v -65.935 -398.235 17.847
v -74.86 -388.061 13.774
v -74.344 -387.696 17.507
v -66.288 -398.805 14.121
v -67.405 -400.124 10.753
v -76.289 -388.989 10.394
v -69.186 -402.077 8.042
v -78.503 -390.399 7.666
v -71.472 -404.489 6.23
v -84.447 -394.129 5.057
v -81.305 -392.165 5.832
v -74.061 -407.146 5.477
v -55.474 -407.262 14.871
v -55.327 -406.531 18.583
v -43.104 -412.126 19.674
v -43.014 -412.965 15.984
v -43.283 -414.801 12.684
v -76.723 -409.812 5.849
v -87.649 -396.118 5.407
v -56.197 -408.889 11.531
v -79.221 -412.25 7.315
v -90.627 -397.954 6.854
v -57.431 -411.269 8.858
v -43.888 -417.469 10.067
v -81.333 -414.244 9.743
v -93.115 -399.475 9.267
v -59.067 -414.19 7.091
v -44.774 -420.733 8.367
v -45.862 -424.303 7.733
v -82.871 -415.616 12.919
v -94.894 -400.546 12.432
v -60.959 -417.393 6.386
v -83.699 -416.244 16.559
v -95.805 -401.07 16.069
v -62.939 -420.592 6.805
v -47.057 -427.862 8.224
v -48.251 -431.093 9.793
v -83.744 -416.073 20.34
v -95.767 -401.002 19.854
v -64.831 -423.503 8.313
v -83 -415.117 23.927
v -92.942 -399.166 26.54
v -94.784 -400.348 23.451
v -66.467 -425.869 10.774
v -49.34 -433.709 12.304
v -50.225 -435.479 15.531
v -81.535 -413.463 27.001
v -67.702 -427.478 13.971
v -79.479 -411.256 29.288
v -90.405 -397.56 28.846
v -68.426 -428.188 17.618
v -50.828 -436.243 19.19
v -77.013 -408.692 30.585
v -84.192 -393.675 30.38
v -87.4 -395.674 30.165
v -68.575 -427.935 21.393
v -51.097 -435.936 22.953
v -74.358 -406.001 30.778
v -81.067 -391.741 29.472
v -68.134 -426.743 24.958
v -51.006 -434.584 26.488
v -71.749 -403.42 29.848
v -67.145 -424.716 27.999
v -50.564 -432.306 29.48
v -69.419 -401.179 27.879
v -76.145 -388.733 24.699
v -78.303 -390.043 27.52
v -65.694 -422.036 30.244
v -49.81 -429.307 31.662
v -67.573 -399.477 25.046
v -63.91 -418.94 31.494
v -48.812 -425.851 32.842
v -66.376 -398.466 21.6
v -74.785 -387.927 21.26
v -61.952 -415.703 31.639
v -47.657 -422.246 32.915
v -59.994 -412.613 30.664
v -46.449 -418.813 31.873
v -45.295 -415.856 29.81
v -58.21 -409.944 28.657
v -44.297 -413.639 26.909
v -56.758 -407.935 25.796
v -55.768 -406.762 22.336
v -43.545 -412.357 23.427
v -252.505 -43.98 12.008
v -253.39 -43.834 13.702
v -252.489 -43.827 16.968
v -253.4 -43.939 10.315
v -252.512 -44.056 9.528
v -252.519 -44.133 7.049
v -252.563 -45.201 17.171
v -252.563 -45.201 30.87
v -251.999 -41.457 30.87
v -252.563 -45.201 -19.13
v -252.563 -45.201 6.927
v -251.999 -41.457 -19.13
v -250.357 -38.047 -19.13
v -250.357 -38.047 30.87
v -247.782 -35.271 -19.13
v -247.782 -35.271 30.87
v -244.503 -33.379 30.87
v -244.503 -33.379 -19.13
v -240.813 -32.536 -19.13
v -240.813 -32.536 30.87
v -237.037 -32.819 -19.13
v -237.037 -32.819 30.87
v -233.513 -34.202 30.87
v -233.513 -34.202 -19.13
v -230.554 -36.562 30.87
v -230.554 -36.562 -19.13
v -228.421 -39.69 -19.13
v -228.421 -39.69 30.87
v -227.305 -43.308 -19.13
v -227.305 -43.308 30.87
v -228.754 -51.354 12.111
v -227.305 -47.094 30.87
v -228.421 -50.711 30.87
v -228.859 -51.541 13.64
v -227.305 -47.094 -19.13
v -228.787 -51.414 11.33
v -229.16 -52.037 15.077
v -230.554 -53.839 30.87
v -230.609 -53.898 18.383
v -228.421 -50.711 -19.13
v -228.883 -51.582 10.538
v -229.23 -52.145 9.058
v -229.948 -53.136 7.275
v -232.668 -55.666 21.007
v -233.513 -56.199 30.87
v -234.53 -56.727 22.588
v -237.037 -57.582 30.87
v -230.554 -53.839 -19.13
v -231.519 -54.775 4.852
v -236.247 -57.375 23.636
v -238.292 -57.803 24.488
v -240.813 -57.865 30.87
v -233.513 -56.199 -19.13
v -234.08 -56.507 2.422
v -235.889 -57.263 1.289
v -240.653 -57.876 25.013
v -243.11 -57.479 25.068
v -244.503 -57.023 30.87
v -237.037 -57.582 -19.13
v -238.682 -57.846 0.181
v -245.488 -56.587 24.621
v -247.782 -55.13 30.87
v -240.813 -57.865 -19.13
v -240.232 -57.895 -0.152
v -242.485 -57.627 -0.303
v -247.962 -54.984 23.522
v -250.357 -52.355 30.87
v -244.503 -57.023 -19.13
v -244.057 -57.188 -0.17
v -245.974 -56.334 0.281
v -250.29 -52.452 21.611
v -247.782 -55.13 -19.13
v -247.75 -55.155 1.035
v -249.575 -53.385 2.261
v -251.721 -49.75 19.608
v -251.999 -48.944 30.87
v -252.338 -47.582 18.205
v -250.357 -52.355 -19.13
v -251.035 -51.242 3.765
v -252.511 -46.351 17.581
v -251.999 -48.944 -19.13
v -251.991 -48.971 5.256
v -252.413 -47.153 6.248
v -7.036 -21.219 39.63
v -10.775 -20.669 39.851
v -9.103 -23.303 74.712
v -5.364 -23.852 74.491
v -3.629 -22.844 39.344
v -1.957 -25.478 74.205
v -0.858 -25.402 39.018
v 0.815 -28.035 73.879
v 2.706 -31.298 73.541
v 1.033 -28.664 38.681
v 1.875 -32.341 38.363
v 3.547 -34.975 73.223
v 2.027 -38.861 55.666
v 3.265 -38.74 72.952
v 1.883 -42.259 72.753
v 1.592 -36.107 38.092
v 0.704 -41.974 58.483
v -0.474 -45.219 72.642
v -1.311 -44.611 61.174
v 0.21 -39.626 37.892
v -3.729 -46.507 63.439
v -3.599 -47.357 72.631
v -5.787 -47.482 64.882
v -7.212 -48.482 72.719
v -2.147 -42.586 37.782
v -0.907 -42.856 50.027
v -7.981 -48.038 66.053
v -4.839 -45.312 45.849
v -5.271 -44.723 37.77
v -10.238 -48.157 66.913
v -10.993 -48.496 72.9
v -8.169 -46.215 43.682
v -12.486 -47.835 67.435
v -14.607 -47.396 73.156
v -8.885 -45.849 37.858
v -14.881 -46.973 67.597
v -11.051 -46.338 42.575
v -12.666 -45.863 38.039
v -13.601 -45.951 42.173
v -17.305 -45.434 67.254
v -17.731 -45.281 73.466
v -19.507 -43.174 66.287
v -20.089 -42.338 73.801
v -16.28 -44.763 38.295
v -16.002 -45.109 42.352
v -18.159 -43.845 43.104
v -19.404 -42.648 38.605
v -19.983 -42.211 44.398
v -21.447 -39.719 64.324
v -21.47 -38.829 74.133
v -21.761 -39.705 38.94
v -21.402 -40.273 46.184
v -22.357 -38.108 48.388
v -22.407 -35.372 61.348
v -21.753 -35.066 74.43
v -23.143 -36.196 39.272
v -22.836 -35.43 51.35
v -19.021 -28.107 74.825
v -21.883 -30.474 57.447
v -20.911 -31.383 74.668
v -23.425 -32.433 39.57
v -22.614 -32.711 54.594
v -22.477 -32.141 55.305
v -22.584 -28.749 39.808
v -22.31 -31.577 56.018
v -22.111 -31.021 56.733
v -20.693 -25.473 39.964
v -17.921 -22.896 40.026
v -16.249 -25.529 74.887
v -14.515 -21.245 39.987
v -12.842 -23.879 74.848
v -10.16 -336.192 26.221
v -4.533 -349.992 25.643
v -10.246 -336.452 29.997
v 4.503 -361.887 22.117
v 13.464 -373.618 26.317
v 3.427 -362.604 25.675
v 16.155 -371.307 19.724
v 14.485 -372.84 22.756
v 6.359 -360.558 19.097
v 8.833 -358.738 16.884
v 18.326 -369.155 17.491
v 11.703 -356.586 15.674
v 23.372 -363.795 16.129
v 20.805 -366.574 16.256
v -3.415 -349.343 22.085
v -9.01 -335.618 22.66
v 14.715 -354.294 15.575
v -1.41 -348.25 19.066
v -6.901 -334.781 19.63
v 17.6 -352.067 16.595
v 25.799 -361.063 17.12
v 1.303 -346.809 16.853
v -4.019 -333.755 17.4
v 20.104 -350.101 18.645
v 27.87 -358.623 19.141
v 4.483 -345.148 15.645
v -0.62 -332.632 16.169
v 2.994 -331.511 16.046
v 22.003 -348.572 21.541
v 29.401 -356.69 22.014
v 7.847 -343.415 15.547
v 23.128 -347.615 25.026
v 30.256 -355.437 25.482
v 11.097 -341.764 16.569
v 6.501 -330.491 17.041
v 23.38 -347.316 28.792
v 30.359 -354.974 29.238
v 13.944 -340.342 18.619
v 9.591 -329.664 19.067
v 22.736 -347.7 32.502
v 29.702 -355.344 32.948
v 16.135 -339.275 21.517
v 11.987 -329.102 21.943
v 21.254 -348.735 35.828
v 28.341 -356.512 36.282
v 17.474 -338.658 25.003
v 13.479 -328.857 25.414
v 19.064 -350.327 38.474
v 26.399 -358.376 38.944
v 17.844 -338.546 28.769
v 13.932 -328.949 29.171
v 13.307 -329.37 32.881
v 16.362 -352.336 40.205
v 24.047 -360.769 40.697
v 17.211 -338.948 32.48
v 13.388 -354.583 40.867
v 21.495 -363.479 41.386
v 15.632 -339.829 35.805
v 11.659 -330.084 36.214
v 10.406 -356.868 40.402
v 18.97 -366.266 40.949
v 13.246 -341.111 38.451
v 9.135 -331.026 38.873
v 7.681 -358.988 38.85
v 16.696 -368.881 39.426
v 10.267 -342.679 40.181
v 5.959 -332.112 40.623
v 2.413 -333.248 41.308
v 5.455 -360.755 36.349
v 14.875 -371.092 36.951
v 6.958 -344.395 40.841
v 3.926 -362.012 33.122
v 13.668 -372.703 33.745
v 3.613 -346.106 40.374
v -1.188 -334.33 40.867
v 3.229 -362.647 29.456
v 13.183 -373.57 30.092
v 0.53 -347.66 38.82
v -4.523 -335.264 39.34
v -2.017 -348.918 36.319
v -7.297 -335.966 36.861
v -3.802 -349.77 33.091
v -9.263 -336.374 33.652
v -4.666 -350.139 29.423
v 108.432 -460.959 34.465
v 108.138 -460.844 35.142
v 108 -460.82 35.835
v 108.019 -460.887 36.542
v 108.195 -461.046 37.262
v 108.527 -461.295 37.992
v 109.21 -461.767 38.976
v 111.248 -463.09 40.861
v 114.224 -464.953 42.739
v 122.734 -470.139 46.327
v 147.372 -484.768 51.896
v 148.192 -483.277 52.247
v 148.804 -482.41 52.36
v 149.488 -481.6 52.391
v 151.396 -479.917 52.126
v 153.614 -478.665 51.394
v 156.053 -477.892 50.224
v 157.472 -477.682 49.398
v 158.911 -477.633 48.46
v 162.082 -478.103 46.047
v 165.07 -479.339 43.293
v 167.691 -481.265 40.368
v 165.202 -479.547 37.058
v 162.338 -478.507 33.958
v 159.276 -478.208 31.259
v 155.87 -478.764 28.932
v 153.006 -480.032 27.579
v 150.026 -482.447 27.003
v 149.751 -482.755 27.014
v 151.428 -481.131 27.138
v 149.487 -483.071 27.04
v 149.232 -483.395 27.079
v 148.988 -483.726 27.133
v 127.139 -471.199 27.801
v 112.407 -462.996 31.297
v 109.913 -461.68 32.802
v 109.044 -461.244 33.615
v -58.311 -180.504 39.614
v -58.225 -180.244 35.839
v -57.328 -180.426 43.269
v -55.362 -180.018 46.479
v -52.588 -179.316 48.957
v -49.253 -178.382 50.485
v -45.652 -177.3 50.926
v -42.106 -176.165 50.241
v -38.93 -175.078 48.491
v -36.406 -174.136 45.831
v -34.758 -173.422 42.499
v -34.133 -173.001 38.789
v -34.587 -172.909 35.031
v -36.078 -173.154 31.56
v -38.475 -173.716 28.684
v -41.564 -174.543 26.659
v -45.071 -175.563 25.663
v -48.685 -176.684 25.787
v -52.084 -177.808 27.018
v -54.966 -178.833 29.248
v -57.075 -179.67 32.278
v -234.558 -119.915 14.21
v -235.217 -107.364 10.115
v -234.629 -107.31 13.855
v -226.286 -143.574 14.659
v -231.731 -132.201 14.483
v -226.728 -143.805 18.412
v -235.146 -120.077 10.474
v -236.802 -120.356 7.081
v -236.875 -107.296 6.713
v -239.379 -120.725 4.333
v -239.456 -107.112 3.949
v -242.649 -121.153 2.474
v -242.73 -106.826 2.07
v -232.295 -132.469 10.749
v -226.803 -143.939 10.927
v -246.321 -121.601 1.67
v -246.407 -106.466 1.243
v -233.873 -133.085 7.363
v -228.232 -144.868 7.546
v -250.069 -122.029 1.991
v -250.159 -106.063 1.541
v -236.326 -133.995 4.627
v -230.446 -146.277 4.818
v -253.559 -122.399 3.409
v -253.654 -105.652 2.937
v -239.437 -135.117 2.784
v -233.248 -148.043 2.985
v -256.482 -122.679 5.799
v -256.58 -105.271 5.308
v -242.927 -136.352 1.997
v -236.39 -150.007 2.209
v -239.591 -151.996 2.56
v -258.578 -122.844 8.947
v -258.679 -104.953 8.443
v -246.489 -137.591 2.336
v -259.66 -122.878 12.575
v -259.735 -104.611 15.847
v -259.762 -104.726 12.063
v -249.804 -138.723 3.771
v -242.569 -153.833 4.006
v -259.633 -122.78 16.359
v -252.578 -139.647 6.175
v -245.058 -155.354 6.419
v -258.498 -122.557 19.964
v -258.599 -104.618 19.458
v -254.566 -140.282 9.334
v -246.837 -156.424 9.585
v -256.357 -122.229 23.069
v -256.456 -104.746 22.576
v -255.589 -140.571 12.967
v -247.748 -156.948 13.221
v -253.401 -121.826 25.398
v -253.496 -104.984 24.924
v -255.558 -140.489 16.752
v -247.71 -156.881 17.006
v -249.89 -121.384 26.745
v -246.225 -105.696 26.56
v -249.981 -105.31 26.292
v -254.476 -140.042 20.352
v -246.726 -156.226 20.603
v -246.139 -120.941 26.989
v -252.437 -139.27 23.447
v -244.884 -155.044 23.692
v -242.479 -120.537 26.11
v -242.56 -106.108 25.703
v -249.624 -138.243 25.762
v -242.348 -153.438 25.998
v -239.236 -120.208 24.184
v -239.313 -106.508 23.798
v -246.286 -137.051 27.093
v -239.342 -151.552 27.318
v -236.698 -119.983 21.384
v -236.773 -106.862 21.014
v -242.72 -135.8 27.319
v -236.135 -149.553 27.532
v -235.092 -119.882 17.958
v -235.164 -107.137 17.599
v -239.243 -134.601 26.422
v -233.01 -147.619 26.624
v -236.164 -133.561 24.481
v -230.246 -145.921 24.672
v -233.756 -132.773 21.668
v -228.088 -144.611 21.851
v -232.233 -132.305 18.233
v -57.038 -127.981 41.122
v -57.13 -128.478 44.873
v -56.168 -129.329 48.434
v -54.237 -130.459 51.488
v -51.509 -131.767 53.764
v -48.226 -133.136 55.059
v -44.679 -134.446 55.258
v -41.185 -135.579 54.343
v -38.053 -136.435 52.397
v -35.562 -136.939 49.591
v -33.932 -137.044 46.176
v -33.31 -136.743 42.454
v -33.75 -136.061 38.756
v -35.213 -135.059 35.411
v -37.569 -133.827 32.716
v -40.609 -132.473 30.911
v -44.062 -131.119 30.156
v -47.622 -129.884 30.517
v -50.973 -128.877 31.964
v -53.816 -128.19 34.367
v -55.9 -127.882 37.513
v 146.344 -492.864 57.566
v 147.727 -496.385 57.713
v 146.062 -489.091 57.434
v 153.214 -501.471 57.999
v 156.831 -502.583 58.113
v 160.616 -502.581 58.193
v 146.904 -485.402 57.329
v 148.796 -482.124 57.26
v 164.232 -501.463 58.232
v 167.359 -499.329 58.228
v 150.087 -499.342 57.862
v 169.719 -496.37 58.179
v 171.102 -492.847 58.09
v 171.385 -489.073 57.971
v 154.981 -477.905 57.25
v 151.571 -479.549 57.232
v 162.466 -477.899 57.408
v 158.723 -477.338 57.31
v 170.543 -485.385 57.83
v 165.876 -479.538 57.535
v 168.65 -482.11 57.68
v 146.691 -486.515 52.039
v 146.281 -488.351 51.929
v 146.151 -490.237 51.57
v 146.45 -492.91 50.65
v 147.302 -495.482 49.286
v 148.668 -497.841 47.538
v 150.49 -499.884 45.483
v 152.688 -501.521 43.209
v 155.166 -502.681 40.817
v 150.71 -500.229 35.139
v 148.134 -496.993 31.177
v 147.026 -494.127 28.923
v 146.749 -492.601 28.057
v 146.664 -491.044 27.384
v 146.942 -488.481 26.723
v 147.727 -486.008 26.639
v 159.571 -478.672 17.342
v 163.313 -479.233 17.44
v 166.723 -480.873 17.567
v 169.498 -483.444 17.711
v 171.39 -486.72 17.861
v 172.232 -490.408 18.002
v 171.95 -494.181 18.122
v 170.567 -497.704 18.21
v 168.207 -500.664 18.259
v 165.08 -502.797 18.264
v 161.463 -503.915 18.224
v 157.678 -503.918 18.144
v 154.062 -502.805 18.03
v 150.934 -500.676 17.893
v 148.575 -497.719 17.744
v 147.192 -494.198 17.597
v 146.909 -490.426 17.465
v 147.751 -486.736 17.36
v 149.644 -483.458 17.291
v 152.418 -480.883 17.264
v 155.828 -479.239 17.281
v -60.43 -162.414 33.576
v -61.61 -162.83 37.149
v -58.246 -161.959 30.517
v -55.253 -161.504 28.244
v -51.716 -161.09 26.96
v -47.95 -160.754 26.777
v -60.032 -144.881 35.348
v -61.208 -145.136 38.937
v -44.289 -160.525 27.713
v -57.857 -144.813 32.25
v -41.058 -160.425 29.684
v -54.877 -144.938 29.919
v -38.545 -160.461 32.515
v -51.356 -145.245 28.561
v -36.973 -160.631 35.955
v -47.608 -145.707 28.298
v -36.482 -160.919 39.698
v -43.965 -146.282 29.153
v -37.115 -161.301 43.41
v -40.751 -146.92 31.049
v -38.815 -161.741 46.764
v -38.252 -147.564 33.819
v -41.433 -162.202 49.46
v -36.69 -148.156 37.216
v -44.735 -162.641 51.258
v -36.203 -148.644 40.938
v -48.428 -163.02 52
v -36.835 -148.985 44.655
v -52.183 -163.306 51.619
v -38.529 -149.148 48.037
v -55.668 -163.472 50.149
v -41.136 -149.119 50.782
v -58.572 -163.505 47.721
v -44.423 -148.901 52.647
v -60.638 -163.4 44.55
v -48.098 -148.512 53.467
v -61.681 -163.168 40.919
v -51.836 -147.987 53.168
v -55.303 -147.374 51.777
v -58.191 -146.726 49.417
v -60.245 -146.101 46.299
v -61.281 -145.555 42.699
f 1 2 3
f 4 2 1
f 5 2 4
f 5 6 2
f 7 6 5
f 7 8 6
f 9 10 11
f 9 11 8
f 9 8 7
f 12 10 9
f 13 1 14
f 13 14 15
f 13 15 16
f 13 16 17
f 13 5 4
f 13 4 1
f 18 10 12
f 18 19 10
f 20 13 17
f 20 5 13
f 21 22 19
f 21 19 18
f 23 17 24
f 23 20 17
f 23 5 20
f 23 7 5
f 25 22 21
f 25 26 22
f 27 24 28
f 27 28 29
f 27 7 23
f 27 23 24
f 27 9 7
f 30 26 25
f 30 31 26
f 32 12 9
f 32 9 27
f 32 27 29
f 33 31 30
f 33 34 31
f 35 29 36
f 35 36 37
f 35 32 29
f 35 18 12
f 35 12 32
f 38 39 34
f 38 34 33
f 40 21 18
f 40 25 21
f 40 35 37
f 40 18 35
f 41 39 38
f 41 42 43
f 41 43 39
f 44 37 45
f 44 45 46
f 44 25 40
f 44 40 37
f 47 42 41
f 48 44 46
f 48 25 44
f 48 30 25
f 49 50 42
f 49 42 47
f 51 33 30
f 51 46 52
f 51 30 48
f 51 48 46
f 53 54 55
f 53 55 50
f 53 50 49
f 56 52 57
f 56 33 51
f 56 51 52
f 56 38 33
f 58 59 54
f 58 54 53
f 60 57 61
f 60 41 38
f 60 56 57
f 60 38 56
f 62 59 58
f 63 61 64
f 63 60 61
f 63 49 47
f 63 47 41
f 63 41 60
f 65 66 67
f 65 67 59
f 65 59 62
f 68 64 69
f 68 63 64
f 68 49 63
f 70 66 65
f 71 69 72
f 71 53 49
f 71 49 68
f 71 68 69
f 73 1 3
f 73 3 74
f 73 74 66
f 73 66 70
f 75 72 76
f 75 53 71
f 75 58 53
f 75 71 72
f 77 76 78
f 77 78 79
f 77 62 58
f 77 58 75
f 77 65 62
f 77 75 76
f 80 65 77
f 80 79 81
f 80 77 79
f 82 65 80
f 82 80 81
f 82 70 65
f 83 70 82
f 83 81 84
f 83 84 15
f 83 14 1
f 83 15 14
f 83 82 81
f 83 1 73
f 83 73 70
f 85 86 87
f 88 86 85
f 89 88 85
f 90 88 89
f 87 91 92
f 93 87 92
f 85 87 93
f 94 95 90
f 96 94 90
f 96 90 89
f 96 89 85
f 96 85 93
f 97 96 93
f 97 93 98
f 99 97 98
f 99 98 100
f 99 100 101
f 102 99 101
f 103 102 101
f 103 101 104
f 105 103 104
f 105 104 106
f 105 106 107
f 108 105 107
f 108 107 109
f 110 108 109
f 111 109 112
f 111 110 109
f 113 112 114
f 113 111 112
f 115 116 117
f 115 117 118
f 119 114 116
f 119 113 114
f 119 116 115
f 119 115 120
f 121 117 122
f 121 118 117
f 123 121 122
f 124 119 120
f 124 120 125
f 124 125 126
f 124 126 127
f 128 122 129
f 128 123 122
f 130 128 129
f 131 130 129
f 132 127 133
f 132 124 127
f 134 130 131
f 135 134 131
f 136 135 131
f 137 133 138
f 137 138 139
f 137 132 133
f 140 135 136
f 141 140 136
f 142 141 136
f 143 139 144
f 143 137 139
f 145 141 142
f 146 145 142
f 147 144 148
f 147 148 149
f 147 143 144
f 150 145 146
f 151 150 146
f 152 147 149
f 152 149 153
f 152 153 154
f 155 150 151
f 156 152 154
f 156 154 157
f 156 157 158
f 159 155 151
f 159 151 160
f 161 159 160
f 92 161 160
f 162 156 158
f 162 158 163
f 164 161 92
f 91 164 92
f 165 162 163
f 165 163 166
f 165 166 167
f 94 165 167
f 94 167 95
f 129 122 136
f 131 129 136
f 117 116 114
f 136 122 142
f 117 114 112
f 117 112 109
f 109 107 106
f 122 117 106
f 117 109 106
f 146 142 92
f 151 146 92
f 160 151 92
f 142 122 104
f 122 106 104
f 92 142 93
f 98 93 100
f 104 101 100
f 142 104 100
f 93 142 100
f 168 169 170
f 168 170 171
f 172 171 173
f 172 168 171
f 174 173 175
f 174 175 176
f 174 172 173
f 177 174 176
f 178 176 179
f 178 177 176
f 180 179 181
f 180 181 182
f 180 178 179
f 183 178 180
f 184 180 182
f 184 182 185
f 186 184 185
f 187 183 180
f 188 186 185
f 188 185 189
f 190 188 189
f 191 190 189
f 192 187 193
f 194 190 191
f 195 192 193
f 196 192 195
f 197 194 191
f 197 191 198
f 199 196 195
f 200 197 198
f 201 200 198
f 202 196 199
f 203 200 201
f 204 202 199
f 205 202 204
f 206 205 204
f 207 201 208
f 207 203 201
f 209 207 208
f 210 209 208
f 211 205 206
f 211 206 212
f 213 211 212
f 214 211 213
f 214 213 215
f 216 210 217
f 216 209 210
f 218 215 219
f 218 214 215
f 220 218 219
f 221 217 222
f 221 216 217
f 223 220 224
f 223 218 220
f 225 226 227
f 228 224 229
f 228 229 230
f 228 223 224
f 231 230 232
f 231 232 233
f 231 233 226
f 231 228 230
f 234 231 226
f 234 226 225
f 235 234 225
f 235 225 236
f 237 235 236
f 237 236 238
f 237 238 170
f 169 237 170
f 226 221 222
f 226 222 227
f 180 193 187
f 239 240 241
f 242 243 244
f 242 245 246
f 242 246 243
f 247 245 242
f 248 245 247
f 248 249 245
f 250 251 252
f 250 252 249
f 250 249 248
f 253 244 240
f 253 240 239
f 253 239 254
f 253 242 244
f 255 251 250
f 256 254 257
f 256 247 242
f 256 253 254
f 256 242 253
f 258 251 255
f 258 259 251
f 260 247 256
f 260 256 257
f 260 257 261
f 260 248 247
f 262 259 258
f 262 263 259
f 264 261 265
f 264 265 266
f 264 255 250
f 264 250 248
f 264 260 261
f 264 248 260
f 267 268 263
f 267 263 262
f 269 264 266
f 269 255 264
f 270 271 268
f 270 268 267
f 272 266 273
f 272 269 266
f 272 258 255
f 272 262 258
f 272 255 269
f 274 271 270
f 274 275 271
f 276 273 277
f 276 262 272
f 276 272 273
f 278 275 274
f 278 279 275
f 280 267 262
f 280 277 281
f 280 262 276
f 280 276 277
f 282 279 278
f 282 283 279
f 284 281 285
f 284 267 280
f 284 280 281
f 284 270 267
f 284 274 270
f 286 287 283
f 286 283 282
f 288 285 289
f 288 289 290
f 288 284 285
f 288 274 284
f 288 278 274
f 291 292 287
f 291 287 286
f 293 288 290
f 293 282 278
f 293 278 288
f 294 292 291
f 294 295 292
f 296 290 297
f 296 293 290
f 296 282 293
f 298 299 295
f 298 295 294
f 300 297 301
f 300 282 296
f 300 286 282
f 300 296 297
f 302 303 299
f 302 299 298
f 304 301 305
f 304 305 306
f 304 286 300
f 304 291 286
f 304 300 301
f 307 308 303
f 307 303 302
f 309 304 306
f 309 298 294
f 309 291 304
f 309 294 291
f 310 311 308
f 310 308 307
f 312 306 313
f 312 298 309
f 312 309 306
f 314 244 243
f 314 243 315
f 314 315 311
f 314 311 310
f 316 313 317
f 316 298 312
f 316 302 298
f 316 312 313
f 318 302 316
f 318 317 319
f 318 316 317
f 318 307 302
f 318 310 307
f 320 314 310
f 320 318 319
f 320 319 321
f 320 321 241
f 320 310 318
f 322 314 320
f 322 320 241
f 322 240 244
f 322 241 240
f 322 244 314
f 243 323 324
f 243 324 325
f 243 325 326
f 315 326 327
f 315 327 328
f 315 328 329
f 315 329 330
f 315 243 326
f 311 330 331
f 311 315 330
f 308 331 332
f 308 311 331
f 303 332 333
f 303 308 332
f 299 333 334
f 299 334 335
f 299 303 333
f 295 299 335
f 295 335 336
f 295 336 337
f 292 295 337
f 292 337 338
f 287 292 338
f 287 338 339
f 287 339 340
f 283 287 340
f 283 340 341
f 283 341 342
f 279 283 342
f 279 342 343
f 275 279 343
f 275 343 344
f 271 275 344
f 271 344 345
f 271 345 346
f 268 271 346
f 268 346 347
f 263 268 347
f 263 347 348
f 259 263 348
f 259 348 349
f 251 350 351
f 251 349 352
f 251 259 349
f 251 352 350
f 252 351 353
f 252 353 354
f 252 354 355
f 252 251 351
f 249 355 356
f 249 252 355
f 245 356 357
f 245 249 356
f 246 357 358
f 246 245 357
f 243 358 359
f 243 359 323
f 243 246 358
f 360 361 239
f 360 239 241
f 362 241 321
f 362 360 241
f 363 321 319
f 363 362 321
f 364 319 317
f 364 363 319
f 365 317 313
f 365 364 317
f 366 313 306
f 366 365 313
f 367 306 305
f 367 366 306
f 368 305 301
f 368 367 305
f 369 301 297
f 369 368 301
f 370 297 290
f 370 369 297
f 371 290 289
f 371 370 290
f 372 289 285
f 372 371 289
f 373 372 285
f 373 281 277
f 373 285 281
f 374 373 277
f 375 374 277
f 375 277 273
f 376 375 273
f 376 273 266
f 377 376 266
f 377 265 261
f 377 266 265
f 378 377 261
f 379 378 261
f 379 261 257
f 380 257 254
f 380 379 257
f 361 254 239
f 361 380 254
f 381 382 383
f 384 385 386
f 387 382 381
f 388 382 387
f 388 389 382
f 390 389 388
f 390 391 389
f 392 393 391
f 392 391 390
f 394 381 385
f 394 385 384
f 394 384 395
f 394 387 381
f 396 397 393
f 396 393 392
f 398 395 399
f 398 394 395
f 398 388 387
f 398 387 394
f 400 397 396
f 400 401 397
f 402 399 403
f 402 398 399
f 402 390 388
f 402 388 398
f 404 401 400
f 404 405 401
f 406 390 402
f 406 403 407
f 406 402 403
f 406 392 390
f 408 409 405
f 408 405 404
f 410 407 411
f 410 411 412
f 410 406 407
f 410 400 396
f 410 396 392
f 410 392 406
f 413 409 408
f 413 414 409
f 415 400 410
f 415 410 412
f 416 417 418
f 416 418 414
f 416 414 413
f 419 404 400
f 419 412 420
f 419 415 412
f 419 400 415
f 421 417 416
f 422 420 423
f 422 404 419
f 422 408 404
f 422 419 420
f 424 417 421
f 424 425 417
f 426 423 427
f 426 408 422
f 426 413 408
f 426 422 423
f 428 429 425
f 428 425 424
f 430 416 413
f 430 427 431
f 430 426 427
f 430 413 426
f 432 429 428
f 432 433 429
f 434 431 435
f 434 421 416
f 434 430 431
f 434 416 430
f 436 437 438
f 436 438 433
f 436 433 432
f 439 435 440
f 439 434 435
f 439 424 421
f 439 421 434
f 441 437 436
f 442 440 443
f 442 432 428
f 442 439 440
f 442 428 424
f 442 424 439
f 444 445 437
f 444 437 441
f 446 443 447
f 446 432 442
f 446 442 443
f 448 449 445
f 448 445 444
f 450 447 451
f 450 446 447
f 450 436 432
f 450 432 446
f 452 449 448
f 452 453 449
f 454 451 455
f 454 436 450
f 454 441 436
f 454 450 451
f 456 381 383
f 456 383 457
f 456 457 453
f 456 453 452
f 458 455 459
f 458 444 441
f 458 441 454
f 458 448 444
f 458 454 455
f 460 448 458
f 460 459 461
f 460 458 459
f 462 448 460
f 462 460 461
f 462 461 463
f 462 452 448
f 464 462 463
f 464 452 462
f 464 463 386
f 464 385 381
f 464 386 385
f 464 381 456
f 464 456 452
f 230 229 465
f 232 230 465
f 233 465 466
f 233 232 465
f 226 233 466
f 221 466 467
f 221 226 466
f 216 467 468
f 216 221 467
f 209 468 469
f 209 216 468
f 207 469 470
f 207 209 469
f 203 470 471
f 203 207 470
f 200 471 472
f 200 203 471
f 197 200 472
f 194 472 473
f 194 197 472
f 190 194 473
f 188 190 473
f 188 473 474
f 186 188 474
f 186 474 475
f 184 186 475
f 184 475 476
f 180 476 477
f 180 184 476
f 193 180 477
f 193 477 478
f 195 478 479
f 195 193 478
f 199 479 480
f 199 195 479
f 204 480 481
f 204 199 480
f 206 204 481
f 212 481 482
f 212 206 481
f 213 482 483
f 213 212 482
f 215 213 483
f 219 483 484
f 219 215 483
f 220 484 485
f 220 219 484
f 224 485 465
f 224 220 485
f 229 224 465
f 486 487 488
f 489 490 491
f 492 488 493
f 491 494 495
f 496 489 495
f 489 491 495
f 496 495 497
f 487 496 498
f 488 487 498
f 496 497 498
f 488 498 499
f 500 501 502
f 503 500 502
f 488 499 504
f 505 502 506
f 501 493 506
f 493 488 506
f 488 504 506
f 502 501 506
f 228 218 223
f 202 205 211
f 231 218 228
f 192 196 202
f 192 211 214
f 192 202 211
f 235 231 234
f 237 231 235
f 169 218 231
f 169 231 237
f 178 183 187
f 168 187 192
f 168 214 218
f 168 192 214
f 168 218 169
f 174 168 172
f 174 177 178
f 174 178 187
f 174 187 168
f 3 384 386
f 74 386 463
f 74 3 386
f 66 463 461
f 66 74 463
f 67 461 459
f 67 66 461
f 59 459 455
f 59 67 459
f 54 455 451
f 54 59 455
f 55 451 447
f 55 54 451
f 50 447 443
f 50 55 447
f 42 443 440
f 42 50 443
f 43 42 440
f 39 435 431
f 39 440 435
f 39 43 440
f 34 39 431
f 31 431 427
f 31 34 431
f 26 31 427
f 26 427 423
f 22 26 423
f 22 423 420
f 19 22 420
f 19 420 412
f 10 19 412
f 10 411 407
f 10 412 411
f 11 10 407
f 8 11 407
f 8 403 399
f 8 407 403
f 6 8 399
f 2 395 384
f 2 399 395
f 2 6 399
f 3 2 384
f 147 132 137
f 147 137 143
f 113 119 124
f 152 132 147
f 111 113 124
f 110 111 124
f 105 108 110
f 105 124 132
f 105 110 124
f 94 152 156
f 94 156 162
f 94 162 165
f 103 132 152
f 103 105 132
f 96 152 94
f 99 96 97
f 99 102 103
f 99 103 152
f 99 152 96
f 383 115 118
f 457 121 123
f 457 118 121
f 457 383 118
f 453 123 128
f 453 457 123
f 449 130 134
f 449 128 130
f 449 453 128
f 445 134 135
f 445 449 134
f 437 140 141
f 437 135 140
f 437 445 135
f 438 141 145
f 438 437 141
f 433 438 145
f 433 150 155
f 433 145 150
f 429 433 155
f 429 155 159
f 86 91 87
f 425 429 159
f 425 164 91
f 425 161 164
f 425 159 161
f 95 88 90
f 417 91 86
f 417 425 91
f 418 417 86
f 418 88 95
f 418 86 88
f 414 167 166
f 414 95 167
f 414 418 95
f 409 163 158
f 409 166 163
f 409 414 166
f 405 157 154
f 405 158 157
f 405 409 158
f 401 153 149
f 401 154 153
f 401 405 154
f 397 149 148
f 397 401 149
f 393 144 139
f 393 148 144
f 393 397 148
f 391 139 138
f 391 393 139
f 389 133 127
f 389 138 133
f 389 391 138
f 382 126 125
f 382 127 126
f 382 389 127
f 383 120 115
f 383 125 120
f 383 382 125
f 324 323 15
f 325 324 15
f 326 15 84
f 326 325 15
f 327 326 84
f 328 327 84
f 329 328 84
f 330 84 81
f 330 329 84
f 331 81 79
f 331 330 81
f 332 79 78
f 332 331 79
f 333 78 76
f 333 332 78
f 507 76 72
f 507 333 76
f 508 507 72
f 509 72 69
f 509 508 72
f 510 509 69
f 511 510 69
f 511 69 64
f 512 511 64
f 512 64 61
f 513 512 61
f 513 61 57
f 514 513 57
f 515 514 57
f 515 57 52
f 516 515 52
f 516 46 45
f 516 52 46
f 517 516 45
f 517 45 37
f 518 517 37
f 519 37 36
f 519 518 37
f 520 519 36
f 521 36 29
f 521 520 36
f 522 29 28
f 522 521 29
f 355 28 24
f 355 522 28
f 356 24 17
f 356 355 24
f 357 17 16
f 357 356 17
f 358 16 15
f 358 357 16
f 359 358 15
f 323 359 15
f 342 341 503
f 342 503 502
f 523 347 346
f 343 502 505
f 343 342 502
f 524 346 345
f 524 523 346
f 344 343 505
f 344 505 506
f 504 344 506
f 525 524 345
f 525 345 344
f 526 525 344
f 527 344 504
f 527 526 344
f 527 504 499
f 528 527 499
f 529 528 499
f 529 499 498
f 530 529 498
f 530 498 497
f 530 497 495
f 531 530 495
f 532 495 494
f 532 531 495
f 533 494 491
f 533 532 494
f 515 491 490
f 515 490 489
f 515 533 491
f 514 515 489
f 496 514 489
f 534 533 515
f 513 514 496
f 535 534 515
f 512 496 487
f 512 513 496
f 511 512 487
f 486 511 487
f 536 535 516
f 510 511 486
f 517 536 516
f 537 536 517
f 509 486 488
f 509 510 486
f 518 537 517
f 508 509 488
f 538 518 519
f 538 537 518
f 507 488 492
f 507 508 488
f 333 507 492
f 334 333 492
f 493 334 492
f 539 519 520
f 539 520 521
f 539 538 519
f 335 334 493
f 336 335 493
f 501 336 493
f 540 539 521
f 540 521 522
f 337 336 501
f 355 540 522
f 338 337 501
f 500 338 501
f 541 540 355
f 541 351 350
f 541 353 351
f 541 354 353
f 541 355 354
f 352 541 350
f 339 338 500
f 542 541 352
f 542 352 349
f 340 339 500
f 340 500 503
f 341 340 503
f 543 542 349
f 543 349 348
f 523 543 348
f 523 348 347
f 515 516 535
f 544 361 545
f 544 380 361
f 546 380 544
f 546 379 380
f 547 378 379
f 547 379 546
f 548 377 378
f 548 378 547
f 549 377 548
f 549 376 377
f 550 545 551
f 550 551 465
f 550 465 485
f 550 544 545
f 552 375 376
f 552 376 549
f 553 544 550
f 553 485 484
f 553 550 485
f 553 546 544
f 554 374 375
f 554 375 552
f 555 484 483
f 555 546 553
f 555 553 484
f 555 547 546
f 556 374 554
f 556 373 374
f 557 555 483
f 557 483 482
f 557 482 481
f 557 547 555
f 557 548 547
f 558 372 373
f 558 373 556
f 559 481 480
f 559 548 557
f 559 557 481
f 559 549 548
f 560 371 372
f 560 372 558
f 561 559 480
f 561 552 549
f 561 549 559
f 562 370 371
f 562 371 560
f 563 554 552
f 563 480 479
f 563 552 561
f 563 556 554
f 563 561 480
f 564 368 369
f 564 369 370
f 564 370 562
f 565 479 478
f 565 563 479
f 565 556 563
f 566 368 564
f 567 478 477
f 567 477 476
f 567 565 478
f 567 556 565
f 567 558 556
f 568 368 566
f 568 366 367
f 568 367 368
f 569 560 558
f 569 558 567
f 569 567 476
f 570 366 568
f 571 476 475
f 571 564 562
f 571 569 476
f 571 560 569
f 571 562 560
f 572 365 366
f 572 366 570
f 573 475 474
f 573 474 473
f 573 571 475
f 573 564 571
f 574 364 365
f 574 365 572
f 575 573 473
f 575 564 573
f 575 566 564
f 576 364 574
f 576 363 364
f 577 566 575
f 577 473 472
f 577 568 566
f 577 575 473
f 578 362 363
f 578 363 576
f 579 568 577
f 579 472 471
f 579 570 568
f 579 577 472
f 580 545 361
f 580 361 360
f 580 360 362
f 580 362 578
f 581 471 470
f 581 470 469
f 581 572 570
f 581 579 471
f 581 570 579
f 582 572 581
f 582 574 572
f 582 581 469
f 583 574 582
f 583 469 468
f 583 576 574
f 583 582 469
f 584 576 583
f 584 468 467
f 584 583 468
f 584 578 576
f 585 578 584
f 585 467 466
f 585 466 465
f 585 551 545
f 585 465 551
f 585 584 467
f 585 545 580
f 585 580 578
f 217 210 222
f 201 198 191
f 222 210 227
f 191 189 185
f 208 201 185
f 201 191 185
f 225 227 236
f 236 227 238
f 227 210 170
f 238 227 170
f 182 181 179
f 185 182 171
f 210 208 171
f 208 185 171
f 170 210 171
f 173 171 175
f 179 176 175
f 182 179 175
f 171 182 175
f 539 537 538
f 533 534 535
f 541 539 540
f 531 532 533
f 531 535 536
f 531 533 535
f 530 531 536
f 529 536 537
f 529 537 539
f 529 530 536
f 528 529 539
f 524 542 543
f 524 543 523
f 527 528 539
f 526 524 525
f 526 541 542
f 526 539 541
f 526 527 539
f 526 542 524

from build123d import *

# Parameters (mm, degrees)
SKETCH2_R           = 12.7
SKETCH3_R           = 12.7
BOSS_EXTRUDE1_DEPTH = 50
SKETCH4_R           = 12.7
BOSS_EXTRUDE2_DEPTH = 35
SKETCH5_R           = 12.7
CUT_EXTRUDE1_DEPTH  = 634.359519319
SKETCH6_R           = 12.7
BOSS_EXTRUDE3_DEPTH = 40


with BuildPart() as part:
    # Sweep1: sweep along a curve in space
    with BuildLine() as sweep1_path:
        Line((-45.263841099, -132.462271612, 42.727197095), (-9.928000519, -34.667527384, 56.556883965))
        ThreePointArc((-45.263841099, -132.462271612, 42.727197095), (-49.367402807, -154.461340148, 40.074170619), (-46.268448436, -176.708192383, 38.254601427))
        Line((1.796645732, -332.656119714, 28.636985574), (-46.268448436, -176.708192383, 38.254601427))
        ThreePointArc((1.796645732, -332.656119714, 28.636985574), (9.693780672, -349.82422739, 28.096448926), (21.793712602, -364.33648604, 28.718411529))
        Line((159.088704017, -490.606286781, 40.497494579), (21.793712602, -364.33648604, 28.718411529))
        Line((159.088704017, -490.606286781, 40.497494579), (-47.055147145, -424.175155849, 20.376642682))
        ThreePointArc((-47.055147145, -424.175155849, 20.376642682), (-68.707848435, -412.682375082, 18.540437025), (-85.12514007, -394.403432402, 17.735499766))
        Line((-85.12514007, -394.403432402, 17.735499766), (-237.067860888, -150.281613827, 14.887673564))
        ThreePointArc((-237.067860888, -150.281613827, 14.887673564), (-245.860225068, -128.979461941, 14.519507014), (-247.259590984, -105.981912067, 13.905207225))
        Line((-247.259590984, -105.981912067, 13.905207225), (-240.877210012, -45.200693371, 12.011549601))
    # Sketch2 → Sweep1 (sweep)
    with BuildSketch(Plane(origin=(-240.877210012, -45.200693371, 12.011549601), x_dir=(0.994511346580908, -0.1045532802574024, -0.003974054509718908), z_dir=(0.10438154847039847, 0.9940550014184, -0.030970090312857718))):
        Circle(SKETCH2_R)
    sweep(path=sweep1_path.line, transition=Transition.RIGHT)

    # Sketch3 → Boss-Extrude1 (add)
    with BuildSketch(Plane(origin=(-240.877210012, -45.200693371, -19.129994659), x_dir=(-1, 0, 0), z_dir=(0, 0, -1))):
        with Locations((-1.013733677, 0)):
            Circle(SKETCH3_R)
    extrude(amount=-BOSS_EXTRUDE1_DEPTH)

    # Sketch4 → Boss-Extrude2 (add)
    with BuildSketch(Plane(origin=(-10.775481352, -33.333297989, 38.894650056), x_dir=(-0.9988573259328992, -0.0035999902794153107, 0.04765587581994679), z_dir=(-0.04779165649125455, 0.07524067855943051, -0.9960194766467865))):
        with Locations(Location((0, 0, 0), (0, 0, 90))):
            Circle(SKETCH4_R)
    extrude(amount=-BOSS_EXTRUDE2_DEPTH)

    # Sketch5 → Cut-Extrude1 (cut, through all)
    with BuildSketch(Plane(origin=(159.570708741, -491.36512975, 17.765263523), x_dir=(-0.9997755298808294, -0.0007068673202907124, -0.021175225857081564), z_dir=(0.02118702082660303, -0.03335573488518622, -0.9992189475278991))):
        Circle(SKETCH5_R)
    extrude(amount=-CUT_EXTRUDE1_DEPTH, mode=Mode.SUBTRACT)


with BuildPart() as body_2:
    # of the pieces the cut leaves, the one that is kept (cut_extrude1_keep)
    add(part.part.solids().sort_by_distance((-228.753597169, -51.353788927, 12.11141185))[0])

    # Sketch6 → Boss-Extrude3 (add)
    with BuildSketch(Plane(origin=(159.570708741, -491.36512975, 17.765263523), x_dir=(-0.9997755298808294, -0.0007068673202907124, -0.021175225857081564), z_dir=(0.02118702082660303, -0.03335573488518622, -0.9992189475278991))):
        with Locations(Location((0, 0, 0), (0, 0, 90))):
            Circle(SKETCH6_R)
    extrude(amount=-BOSS_EXTRUDE3_DEPTH)


solid = body_2.part
